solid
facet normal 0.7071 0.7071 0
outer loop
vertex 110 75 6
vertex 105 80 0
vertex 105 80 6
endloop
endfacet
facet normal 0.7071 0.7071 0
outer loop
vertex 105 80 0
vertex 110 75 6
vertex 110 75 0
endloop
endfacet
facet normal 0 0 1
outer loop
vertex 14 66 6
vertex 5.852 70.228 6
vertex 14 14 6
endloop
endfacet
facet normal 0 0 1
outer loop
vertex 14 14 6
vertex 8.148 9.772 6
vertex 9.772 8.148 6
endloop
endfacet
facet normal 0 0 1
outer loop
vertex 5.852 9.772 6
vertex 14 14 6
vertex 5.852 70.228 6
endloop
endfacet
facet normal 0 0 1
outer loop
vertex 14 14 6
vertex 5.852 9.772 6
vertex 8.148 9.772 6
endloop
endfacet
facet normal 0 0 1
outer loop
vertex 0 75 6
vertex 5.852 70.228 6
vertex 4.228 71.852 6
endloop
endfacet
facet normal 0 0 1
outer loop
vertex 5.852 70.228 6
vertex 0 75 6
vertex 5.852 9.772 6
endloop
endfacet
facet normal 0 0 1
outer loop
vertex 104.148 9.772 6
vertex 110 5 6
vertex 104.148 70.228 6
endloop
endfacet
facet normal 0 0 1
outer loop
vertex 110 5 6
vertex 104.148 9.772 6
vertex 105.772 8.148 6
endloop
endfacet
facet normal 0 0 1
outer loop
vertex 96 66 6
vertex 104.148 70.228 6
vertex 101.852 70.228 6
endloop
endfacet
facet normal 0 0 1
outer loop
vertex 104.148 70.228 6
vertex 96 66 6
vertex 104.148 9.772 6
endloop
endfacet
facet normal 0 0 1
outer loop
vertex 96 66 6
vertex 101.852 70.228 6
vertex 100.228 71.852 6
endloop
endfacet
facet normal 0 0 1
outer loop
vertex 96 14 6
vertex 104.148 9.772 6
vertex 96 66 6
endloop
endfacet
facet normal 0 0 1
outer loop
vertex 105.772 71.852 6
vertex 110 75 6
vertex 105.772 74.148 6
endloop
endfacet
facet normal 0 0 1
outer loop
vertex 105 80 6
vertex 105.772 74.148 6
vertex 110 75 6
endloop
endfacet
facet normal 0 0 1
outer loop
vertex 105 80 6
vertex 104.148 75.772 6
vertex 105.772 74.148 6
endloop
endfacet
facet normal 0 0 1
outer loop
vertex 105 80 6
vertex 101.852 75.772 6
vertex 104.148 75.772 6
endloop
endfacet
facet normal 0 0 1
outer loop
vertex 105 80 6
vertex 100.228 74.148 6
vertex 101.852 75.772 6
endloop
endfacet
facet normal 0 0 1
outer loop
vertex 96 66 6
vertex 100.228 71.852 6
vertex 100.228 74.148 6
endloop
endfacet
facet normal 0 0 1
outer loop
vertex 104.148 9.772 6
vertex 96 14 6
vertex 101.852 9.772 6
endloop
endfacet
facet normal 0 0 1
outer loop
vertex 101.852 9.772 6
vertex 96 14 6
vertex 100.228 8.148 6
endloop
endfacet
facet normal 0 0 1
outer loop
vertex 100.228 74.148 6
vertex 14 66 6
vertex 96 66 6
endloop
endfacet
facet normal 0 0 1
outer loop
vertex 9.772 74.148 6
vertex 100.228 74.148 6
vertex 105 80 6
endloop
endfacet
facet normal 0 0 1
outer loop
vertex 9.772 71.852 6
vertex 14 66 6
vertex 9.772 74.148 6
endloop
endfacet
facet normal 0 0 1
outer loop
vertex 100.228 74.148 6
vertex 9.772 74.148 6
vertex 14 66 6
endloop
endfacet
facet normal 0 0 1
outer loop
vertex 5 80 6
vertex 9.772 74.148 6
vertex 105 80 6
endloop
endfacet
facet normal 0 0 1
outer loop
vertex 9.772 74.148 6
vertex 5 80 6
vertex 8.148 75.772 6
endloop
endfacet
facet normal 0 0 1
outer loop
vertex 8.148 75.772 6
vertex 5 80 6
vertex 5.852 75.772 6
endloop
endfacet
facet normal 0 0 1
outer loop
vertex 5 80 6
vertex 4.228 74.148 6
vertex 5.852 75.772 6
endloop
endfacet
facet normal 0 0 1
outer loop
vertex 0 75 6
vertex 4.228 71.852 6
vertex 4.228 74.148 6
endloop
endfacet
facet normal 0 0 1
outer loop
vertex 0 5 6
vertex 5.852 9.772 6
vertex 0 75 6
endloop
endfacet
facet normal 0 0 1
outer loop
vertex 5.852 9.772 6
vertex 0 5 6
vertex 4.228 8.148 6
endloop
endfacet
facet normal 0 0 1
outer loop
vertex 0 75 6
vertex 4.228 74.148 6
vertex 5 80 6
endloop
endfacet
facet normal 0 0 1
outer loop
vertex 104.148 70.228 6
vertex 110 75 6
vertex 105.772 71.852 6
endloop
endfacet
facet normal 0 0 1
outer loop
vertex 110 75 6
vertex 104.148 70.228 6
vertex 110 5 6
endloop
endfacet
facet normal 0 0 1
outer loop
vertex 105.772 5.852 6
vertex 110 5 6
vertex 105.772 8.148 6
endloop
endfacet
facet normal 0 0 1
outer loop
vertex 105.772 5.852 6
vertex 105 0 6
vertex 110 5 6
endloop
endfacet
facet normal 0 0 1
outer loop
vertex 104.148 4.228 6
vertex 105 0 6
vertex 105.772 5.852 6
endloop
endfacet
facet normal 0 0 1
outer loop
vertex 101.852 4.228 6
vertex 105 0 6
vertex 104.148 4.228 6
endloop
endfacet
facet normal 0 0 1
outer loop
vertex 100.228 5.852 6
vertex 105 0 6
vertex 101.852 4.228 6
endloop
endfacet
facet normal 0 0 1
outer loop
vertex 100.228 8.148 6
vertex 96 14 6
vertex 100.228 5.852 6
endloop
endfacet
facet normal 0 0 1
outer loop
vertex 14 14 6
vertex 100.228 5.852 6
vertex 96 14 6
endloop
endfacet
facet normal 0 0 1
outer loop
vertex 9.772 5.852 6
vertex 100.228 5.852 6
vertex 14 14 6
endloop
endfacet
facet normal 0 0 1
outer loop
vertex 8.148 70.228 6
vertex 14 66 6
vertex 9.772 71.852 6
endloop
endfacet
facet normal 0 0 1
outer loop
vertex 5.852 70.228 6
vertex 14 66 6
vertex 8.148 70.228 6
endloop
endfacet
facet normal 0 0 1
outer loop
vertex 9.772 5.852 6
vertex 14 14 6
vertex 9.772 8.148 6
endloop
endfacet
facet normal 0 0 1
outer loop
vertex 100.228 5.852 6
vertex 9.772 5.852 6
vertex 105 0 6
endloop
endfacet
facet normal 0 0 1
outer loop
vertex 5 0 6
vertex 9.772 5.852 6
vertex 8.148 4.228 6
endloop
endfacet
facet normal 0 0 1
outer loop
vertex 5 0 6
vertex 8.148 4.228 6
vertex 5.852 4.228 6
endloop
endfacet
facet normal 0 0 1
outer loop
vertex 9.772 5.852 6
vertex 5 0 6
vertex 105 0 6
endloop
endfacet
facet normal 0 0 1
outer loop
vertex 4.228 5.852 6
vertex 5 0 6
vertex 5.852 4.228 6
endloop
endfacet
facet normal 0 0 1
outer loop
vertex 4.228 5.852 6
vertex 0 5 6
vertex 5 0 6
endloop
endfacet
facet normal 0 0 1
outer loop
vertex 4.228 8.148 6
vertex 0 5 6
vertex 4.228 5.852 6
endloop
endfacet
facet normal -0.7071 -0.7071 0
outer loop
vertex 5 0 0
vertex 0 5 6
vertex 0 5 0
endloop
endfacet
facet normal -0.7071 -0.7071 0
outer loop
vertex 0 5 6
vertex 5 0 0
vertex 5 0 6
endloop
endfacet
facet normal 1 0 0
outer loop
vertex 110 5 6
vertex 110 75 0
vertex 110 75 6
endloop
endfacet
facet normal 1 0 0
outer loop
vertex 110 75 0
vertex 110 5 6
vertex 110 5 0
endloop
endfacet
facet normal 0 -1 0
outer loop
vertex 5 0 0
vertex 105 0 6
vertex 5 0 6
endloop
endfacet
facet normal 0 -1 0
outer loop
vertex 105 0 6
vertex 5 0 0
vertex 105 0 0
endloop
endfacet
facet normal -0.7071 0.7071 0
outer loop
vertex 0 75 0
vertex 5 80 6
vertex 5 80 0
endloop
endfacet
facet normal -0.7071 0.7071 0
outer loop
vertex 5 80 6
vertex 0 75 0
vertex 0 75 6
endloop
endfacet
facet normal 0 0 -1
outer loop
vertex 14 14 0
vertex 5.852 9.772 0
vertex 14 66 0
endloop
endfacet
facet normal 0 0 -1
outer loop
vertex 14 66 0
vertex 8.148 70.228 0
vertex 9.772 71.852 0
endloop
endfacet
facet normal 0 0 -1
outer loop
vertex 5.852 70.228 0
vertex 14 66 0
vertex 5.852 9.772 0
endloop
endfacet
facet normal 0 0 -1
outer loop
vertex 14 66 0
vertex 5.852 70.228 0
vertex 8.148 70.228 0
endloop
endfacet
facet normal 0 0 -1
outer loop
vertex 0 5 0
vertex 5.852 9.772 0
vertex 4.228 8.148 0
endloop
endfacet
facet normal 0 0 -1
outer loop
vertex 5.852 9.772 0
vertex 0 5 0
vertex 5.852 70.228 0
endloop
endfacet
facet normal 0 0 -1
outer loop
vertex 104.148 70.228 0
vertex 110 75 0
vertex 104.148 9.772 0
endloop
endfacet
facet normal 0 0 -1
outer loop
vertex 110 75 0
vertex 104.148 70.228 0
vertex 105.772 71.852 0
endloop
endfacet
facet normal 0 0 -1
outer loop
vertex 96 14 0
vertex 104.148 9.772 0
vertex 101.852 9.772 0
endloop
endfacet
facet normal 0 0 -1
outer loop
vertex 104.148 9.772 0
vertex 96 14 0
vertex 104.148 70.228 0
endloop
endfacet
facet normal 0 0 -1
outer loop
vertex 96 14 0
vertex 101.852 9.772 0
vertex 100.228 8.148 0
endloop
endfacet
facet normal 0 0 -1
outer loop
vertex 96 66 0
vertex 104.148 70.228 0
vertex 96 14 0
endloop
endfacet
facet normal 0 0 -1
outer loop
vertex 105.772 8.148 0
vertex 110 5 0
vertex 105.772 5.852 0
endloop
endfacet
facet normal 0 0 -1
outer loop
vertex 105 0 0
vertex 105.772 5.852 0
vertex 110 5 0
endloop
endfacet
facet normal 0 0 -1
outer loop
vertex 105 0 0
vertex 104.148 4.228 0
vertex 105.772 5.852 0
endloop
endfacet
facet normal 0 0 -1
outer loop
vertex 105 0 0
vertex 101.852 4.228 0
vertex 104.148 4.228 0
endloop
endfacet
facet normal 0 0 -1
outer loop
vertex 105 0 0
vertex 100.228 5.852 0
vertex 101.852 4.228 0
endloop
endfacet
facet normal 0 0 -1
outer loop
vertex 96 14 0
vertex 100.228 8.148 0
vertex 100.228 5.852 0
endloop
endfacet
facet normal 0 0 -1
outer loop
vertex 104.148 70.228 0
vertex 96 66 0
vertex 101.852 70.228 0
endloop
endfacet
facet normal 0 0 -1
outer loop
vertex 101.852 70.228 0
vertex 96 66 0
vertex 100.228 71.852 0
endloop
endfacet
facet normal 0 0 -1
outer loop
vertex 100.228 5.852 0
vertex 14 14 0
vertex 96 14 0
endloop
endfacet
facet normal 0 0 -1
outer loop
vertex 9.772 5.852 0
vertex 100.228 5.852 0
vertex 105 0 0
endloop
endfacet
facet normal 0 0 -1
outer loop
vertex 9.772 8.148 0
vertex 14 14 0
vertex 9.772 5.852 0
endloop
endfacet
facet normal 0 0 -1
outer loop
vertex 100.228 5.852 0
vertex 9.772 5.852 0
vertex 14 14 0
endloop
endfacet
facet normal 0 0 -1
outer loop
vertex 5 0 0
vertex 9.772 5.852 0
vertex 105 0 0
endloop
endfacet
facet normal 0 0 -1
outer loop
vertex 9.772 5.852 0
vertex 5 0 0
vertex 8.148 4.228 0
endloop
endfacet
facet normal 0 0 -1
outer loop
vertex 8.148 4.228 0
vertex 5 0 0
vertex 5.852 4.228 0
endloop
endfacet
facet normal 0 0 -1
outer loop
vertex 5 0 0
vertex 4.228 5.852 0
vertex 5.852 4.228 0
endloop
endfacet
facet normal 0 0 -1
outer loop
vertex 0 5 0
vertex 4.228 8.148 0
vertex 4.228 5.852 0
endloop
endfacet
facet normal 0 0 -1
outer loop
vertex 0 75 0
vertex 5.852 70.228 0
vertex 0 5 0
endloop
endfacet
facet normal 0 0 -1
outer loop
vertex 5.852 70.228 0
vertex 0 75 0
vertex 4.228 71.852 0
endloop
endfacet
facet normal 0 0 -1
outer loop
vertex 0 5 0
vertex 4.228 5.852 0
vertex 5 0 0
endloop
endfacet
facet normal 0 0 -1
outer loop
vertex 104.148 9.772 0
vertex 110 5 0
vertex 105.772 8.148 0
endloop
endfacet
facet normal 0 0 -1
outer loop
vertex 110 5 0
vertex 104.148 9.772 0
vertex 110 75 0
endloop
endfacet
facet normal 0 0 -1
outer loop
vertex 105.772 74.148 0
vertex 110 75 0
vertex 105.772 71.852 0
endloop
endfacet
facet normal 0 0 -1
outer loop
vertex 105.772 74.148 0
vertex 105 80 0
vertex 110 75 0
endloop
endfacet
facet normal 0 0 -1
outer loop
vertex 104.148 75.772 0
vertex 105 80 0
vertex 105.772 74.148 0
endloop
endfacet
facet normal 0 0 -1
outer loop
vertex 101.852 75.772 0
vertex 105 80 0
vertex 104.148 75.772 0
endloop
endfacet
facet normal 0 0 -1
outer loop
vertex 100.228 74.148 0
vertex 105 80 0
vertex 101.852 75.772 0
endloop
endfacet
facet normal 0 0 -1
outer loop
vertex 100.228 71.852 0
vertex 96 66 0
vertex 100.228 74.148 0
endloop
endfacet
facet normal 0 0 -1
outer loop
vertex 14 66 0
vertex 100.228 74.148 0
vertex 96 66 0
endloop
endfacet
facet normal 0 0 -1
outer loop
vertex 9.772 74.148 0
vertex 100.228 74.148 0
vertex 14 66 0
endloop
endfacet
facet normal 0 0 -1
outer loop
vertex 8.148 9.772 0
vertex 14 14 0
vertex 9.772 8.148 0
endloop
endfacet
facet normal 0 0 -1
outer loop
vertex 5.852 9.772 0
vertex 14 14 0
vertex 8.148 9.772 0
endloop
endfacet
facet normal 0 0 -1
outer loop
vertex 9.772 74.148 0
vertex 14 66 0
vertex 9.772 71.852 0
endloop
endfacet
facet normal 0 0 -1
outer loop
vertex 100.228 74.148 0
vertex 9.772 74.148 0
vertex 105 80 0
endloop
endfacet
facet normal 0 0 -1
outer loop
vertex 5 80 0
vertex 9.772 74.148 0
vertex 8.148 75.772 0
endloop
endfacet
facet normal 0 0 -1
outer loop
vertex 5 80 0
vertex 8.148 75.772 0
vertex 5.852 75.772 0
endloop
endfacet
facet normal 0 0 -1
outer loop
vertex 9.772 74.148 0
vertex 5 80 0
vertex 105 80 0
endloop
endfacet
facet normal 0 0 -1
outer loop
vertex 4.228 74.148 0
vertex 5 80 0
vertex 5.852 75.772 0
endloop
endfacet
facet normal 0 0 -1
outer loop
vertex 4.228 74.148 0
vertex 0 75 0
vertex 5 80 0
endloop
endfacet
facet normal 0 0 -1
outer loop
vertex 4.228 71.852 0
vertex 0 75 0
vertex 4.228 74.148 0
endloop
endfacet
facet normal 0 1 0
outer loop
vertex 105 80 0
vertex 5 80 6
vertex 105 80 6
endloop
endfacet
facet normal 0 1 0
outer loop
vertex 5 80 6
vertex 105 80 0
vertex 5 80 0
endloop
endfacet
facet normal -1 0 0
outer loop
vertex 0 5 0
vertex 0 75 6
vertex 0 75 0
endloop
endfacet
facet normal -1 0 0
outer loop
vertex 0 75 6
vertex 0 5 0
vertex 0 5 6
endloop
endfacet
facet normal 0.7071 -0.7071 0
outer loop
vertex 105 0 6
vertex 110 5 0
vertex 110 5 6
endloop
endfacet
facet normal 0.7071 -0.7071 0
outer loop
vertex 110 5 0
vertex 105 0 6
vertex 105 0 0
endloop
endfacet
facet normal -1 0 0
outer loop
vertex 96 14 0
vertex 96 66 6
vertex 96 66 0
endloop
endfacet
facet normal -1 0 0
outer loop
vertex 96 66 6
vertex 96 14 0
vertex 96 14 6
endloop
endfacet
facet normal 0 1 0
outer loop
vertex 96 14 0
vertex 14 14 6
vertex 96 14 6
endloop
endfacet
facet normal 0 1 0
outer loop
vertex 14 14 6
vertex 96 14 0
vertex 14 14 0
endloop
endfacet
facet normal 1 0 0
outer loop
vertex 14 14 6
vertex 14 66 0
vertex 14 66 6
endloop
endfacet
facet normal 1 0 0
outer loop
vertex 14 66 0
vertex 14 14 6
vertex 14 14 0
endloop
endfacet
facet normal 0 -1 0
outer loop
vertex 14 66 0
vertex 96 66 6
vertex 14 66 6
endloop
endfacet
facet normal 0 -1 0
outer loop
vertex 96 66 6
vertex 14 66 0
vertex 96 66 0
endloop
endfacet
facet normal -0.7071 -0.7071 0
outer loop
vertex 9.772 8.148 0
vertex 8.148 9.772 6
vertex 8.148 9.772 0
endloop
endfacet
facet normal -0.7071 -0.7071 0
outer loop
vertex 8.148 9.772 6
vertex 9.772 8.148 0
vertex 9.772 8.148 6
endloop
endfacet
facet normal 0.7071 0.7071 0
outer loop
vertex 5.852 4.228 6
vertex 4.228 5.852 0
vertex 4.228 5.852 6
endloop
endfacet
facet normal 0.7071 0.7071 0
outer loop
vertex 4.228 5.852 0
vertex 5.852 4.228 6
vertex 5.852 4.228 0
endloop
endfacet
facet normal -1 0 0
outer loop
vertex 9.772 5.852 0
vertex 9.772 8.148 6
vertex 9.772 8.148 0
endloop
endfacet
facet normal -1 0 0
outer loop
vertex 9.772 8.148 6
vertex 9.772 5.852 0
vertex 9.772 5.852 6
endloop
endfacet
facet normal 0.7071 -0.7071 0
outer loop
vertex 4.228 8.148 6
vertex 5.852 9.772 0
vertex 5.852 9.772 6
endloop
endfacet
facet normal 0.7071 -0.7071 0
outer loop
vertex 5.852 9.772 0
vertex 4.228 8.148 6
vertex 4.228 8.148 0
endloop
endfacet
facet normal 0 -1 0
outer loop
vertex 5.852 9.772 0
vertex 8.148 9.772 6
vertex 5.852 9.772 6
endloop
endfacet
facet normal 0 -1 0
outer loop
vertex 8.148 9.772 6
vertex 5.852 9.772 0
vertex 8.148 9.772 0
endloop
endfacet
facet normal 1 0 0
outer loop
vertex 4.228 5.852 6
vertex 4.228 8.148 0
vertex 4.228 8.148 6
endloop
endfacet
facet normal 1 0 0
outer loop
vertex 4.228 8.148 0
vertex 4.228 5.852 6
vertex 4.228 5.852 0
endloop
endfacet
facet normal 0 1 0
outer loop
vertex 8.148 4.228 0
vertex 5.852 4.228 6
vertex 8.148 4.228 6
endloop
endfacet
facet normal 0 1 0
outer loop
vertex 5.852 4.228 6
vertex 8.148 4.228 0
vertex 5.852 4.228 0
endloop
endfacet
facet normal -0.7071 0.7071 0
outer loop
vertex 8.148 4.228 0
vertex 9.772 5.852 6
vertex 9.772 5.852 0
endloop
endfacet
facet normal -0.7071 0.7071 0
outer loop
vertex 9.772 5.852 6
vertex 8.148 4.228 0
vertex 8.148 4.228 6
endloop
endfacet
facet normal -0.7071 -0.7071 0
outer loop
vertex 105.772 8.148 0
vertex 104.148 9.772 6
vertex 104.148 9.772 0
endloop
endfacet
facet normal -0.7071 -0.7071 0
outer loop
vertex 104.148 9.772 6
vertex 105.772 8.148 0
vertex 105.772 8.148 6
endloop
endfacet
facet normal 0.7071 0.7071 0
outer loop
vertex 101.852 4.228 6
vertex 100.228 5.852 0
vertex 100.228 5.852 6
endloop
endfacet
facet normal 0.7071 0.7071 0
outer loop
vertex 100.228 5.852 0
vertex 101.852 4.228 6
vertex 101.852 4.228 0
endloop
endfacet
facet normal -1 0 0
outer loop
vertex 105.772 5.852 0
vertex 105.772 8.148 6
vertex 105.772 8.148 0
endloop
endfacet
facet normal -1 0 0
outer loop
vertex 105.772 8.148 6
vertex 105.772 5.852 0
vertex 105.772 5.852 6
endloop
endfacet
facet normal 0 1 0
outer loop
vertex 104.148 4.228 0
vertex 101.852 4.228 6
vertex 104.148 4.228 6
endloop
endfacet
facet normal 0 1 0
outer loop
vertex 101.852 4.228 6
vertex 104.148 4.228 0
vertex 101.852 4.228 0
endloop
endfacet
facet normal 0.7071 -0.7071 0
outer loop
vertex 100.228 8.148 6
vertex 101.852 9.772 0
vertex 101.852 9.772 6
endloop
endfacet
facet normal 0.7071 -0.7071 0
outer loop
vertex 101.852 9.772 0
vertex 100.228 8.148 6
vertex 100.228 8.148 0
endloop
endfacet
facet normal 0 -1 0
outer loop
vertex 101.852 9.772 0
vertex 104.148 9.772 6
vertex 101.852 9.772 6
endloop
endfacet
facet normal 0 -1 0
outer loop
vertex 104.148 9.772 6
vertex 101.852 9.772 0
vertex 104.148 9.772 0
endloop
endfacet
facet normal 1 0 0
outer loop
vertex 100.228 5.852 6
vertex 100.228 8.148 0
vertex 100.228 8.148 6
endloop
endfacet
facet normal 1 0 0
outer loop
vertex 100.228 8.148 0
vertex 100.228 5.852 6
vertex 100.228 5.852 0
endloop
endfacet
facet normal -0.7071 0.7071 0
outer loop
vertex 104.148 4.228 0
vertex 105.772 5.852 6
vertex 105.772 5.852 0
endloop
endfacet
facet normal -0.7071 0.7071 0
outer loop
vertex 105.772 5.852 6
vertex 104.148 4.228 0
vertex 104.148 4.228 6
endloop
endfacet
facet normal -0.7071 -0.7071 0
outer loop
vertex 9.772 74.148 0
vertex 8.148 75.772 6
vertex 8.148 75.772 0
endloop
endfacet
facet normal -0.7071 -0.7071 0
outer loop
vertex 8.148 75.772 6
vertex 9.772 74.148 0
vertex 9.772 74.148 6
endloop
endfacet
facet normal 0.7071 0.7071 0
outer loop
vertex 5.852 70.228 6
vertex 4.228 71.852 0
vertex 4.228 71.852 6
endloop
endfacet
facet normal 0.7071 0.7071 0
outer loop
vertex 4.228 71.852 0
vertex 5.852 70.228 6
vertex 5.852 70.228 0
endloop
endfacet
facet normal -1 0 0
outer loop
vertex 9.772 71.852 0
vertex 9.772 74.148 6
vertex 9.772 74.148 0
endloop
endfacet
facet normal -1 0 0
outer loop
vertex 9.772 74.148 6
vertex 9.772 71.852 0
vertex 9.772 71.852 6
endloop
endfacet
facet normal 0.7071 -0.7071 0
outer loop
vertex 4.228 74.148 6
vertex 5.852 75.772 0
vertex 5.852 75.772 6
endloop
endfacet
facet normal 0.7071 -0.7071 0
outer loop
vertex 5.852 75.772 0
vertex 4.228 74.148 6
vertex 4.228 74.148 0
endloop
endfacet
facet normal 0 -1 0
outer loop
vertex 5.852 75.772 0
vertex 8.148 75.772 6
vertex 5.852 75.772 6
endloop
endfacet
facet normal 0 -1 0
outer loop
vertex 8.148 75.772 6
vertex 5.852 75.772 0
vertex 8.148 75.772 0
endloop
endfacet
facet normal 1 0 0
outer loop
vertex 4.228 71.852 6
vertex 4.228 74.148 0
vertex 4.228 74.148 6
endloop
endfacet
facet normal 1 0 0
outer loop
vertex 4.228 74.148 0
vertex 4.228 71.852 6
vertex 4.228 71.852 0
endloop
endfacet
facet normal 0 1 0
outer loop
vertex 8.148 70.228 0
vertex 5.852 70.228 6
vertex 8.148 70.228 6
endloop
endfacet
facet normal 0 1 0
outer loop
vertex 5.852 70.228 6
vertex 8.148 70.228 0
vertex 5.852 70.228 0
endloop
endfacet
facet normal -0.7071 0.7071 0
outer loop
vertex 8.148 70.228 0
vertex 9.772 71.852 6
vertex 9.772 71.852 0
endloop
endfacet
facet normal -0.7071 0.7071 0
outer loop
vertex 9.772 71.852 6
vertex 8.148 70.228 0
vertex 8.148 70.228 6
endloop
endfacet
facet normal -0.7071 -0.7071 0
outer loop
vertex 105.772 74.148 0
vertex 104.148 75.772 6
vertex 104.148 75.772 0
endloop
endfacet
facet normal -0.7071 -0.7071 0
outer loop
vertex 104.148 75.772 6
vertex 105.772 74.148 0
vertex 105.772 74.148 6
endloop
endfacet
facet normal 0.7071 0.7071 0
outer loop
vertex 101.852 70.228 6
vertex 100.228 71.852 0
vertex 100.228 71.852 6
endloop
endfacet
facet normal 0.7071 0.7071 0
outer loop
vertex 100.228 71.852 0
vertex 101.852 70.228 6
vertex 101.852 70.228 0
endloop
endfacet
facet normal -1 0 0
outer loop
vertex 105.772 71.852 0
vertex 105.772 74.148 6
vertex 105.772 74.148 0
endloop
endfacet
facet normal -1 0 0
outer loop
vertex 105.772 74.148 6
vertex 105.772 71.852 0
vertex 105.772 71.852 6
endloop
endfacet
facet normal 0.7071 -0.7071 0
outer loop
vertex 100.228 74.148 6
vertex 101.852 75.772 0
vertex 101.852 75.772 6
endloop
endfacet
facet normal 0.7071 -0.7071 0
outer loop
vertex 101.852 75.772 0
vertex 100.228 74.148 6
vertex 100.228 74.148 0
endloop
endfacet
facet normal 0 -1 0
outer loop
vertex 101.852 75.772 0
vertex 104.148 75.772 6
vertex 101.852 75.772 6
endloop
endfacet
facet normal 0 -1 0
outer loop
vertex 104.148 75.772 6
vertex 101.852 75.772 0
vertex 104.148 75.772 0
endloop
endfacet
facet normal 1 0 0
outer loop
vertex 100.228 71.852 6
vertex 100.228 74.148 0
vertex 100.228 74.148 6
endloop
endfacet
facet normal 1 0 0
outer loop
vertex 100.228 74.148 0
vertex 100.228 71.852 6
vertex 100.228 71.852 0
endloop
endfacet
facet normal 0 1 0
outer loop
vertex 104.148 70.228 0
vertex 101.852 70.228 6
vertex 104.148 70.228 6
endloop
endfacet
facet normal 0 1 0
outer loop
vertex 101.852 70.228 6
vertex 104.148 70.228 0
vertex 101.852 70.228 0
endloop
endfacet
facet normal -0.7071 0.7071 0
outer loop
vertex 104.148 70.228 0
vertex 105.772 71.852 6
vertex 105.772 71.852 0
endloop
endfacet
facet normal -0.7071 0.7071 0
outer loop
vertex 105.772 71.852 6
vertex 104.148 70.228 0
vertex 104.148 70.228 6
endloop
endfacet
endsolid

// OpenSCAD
$fn = 32;

// ----------------------------------------------------------------------
// Frame plate: 110 x 80 frame, 14 mm rails
// ----------------------------------------------------------------------

// --- parameters (mm) ---
plate_l = 110;            // plate length, X
plate_w = 80;             // plate width, Y
plate_t = 6;              // plate thickness, Z (extrusion height)
corner_c = 5;             // corner chamfer
frame_bar = 14;           // frame rail width
bolt_r = 3;               // corner bolt window radius
bolt_inset = 7;           // bolt centre inset from the edges

win_l = plate_l - 2 * frame_bar;  // window length
win_w = plate_w - 2 * frame_bar;  // window width
bolt_d = 2 * bolt_r;  // corner hole diameter

profile = [[5, 0], [105, 0], [110, 5], [110, 75], [105, 80], [5, 80], [0, 75], [0, 5]];  // primary outline, 8 points, counter clockwise
void_1 = [[14, 14], [96, 14], [96, 66], [14, 66]];  // the window, 4 points
void_2 = [[9.772, 8.148], [8.148, 9.772], [5.852, 9.772], [4.228, 8.148], [4.228, 5.852], [5.852, 4.228], [8.148, 4.228], [9.772, 5.852]];  // corner bolt window, 8 points
void_3 = [[105.772, 8.148], [104.148, 9.772], [101.852, 9.772], [100.228, 8.148], [100.228, 5.852], [101.852, 4.228], [104.148, 4.228], [105.772, 5.852]];  // corner bolt window, 8 points
void_4 = [[9.772, 74.148], [8.148, 75.772], [5.852, 75.772], [4.228, 74.148], [4.228, 71.852], [5.852, 70.228], [8.148, 70.228], [9.772, 71.852]];  // corner bolt window, 8 points
void_5 = [[105.772, 74.148], [104.148, 75.772], [101.852, 75.772], [100.228, 74.148], [100.228, 71.852], [101.852, 70.228], [104.148, 70.228], [105.772, 71.852]];  // corner bolt window, 8 points

// --- the one profile operation ---
difference() {
  linear_extrude(height = plate_t) polygon(points = profile);
  translate([0, 0, -1])
    linear_extrude(height = plate_t + 2) polygon(points = void_1);
  translate([0, 0, -1])
    linear_extrude(height = plate_t + 2) polygon(points = void_2);
  translate([0, 0, -1])
    linear_extrude(height = plate_t + 2) polygon(points = void_3);
  translate([0, 0, -1])
    linear_extrude(height = plate_t + 2) polygon(points = void_4);
  translate([0, 0, -1])
    linear_extrude(height = plate_t + 2) polygon(points = void_5);
}
